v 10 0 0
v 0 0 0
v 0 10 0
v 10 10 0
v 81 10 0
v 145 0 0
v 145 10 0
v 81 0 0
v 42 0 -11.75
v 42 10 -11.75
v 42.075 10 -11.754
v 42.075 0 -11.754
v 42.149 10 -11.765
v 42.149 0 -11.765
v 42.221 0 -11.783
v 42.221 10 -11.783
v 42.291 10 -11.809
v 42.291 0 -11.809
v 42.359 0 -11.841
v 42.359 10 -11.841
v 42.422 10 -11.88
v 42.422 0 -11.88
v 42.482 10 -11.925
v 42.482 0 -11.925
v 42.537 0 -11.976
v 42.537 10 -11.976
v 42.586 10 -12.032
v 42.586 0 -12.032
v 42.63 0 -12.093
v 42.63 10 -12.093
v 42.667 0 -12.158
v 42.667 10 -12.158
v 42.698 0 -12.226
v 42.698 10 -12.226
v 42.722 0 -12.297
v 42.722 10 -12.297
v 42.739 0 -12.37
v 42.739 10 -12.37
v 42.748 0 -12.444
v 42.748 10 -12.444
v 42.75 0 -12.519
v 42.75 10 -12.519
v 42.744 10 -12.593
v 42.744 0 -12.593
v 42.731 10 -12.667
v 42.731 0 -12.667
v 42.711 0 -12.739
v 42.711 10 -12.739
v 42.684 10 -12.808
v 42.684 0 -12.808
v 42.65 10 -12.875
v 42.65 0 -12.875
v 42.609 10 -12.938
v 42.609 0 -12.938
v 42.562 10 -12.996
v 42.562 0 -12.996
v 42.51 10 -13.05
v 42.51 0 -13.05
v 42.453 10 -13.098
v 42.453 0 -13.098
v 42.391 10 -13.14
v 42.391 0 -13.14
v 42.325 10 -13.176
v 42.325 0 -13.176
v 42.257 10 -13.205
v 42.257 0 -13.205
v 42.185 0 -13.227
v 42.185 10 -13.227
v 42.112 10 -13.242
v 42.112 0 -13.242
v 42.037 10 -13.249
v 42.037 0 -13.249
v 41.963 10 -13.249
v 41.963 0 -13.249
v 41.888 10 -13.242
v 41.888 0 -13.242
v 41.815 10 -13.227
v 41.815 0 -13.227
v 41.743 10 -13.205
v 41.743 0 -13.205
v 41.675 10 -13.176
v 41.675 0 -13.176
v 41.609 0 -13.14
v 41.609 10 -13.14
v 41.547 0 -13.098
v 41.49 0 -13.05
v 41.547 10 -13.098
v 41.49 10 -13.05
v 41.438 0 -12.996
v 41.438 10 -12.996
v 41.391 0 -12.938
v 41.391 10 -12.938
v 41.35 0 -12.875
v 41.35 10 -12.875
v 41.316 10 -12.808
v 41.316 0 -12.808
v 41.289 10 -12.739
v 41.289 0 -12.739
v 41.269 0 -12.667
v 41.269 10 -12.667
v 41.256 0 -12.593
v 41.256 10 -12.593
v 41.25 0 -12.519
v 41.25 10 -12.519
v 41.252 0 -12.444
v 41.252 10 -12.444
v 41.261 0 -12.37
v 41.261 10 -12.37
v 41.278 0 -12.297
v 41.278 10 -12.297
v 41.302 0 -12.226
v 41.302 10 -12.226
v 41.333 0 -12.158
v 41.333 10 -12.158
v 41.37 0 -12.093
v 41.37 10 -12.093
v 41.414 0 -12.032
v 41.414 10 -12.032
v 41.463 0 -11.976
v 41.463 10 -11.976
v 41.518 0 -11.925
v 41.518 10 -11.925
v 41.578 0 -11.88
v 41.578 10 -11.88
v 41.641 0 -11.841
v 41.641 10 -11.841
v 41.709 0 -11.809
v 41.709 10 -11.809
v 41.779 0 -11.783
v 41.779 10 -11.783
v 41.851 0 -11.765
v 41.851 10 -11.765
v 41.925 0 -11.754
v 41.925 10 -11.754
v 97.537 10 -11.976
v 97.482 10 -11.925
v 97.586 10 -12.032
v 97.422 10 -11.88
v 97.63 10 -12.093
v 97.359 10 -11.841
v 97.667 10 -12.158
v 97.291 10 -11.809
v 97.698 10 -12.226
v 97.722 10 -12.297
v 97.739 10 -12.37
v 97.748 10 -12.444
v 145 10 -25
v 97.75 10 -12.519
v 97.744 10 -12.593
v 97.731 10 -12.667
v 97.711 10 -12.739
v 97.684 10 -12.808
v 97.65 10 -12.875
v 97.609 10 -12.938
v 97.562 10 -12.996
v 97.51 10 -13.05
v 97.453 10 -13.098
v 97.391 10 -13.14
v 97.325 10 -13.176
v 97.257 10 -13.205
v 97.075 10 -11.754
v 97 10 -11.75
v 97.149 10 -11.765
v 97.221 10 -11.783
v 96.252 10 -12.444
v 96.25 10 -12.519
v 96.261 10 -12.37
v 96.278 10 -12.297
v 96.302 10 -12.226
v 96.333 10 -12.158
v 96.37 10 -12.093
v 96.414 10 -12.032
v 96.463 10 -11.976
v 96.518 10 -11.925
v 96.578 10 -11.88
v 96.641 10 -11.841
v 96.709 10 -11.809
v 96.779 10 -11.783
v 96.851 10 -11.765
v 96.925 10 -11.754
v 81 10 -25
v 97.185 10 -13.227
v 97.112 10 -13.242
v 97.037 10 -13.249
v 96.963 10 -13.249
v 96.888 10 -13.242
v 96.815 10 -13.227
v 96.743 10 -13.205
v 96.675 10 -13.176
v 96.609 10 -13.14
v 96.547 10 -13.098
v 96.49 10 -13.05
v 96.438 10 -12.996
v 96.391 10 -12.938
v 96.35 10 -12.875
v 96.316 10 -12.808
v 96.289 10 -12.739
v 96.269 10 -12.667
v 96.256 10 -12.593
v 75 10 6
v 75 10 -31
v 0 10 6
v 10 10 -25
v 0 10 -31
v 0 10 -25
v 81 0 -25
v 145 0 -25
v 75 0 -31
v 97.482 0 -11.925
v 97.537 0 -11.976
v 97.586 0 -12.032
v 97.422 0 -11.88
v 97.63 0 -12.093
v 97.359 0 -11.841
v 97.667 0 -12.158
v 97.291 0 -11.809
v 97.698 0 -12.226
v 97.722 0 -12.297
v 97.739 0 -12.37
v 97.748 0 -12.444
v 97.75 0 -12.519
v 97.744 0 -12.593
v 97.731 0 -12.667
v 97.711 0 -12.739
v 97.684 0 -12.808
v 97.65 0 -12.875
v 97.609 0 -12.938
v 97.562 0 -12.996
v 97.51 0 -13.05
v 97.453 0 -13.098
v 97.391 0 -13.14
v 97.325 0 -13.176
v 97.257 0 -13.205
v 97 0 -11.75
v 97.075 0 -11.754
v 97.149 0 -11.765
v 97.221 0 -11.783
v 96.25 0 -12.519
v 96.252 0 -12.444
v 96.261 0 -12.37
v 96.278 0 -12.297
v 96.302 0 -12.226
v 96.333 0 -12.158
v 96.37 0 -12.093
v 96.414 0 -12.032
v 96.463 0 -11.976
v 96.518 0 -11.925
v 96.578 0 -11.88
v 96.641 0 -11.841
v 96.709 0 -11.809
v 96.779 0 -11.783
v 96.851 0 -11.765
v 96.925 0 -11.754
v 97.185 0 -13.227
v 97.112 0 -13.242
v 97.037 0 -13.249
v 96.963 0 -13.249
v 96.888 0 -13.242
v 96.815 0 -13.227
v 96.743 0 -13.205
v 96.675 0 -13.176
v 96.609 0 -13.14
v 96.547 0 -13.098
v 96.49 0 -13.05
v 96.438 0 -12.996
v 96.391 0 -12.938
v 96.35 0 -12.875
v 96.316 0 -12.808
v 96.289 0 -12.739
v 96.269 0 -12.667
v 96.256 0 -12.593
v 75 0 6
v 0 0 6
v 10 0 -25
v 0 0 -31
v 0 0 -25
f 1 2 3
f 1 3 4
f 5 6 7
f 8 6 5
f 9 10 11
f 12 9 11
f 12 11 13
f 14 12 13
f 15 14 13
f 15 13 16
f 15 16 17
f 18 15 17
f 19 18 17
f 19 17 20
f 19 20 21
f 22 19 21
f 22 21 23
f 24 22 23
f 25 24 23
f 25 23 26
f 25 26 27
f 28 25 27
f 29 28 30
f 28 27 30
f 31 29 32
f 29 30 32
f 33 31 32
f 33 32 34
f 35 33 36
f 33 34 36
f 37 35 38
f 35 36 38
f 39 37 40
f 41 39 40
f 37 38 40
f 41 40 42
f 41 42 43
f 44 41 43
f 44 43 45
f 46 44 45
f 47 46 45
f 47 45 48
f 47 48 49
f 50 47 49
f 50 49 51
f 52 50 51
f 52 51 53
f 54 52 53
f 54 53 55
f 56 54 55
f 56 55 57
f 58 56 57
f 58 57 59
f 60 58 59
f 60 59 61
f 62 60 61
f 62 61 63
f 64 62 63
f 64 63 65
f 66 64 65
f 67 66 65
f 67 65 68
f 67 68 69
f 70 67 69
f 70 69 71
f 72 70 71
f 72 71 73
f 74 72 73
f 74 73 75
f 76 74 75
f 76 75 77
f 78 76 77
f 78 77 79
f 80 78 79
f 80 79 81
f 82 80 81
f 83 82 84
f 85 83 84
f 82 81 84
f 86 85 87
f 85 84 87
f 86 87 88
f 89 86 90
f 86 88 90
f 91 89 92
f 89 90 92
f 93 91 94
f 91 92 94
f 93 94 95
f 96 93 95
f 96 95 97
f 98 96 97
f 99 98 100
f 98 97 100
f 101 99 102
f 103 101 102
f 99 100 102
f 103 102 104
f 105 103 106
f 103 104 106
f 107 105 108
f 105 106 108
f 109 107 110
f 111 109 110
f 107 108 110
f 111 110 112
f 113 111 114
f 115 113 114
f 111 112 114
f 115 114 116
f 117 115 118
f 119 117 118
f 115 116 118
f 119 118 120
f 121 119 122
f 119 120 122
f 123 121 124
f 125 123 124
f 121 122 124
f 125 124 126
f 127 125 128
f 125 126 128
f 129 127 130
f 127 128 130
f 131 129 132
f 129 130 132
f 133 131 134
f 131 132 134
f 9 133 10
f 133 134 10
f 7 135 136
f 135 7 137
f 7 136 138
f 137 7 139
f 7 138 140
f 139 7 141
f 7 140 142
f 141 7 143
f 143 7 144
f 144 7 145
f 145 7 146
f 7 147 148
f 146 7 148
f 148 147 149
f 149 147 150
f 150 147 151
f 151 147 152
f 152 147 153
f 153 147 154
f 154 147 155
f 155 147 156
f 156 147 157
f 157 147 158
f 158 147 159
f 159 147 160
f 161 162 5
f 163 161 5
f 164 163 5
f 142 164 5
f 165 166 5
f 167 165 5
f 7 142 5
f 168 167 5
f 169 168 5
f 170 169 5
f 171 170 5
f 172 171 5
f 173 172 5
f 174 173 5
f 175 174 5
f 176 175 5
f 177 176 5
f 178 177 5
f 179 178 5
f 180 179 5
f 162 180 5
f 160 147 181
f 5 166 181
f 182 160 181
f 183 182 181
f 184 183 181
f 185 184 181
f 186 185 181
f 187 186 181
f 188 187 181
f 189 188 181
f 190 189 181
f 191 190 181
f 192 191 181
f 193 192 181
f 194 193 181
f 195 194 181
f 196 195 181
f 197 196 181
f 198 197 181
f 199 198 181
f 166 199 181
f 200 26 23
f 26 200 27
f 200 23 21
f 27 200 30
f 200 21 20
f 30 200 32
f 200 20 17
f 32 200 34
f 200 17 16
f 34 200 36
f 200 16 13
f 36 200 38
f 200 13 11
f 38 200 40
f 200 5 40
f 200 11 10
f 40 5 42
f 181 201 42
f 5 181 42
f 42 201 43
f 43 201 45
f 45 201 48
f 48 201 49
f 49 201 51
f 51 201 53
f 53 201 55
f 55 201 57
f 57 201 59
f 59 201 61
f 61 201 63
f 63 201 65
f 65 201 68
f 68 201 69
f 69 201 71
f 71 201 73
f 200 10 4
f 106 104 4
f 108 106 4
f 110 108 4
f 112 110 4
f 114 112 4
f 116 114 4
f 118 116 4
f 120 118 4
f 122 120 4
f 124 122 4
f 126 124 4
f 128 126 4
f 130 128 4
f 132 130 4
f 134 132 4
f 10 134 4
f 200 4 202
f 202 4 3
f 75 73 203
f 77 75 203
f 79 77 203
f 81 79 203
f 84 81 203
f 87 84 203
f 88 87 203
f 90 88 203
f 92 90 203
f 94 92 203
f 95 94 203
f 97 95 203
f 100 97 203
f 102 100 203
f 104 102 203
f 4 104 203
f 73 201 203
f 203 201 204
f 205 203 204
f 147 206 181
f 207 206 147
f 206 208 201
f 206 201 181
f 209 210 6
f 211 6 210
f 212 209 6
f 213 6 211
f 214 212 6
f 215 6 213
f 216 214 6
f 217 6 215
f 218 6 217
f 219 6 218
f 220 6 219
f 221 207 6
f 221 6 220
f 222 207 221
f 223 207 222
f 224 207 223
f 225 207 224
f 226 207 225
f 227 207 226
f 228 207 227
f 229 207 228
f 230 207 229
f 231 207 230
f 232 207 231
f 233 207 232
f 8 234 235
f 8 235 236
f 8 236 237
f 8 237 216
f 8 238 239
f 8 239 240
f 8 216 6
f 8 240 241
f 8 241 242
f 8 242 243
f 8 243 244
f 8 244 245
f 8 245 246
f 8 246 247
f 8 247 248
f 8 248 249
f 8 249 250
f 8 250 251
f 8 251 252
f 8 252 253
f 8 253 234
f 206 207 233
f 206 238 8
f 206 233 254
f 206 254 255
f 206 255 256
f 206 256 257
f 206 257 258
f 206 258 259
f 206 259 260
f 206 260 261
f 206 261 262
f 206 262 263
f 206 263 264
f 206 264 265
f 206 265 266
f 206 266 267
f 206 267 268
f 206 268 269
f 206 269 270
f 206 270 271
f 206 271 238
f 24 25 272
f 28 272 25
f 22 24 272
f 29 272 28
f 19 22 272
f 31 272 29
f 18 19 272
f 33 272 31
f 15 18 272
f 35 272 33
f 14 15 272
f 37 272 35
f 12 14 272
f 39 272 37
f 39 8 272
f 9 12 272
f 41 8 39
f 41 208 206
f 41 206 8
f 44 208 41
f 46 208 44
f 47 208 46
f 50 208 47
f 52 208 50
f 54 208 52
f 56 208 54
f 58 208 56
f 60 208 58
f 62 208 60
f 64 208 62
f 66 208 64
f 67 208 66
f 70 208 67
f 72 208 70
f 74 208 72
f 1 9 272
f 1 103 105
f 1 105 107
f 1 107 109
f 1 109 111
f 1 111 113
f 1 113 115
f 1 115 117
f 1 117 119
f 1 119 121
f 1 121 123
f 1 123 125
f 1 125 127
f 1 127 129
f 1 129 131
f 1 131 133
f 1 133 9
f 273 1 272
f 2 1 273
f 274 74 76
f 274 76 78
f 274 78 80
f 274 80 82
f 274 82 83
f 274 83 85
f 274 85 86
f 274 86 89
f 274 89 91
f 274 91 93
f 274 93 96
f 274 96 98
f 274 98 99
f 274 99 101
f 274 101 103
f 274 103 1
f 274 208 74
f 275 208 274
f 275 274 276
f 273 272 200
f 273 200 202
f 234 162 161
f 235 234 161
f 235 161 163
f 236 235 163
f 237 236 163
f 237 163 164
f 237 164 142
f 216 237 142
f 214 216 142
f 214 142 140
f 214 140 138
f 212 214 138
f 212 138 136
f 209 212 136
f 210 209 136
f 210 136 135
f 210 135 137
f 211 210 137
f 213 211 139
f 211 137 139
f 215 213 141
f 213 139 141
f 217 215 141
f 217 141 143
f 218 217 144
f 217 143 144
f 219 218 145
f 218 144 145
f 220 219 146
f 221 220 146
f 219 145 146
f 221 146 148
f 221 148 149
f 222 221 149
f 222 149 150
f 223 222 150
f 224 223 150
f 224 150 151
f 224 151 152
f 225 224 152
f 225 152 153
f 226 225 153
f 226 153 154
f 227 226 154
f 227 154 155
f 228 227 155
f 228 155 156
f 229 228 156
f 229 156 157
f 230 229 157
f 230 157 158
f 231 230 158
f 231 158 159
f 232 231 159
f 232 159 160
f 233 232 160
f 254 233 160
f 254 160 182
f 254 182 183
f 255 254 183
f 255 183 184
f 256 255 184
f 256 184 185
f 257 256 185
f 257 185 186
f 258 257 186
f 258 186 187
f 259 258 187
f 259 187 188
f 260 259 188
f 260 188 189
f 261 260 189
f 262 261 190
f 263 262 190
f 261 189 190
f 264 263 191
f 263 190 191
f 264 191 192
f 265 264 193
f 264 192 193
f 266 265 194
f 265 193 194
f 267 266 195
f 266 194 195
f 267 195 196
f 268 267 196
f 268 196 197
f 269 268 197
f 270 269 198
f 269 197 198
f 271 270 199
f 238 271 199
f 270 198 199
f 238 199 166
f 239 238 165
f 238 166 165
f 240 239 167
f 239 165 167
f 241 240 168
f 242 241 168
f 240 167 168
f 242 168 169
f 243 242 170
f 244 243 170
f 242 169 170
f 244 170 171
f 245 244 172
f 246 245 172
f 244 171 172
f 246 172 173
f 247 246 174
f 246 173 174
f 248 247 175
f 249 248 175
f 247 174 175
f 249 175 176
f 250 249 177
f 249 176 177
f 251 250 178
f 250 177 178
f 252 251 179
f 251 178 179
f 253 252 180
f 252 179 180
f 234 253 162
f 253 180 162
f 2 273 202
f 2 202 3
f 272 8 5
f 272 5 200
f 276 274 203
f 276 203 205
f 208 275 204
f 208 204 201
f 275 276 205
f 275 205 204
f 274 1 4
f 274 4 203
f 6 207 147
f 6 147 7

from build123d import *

# Parameters (mm, degrees)
EXTRUDE_1_DEPTH        = 10
SKETCH_2_R             = 0.75
CUT_EXTRUDE_1_DEPTH    = 149.613592918
PATTERN_LINEAR_1_COUNT = 2
PATTERN_LINEAR_1_PITCH = 55


with BuildPart() as part:
    # Эскиз1 → Бобышка-Вытянуть1 (new body)
    with BuildSketch(Plane(origin=(0, 0, 0), x_dir=(1, 0, 0), z_dir=(0, 1, 0))):
        Polygon((0, 31), (75, 31), (81, 25), (145, 25), (145, 0), (81, 0), (75, -6), (0, -6), (0, 0), (10, 0), (10, 25), (0, 25), align=None)
    extrude(amount=EXTRUDE_1_DEPTH)

    # Эскиз2 → Вырез-Вытянуть1 (cut, through all)
    with BuildSketch(Plane(origin=(0, 10, 0), x_dir=(1, 0, 0), z_dir=(0, 1, 0))):
        with Locations(Location((42, 12.5, 0), (0, 0, 270))):
            Circle(SKETCH_2_R)
    cut_extrude_1 = extrude(amount=-CUT_EXTRUDE_1_DEPTH, mode=Mode.SUBTRACT)

    # Линейный массив1: Вырез-Вытянуть1 ×2
    with Locations(*[(i * PATTERN_LINEAR_1_PITCH, 0, 0) for i in range(1, PATTERN_LINEAR_1_COUNT)]):
        add(cut_extrude_1, mode=Mode.SUBTRACT)


solid = part.part
